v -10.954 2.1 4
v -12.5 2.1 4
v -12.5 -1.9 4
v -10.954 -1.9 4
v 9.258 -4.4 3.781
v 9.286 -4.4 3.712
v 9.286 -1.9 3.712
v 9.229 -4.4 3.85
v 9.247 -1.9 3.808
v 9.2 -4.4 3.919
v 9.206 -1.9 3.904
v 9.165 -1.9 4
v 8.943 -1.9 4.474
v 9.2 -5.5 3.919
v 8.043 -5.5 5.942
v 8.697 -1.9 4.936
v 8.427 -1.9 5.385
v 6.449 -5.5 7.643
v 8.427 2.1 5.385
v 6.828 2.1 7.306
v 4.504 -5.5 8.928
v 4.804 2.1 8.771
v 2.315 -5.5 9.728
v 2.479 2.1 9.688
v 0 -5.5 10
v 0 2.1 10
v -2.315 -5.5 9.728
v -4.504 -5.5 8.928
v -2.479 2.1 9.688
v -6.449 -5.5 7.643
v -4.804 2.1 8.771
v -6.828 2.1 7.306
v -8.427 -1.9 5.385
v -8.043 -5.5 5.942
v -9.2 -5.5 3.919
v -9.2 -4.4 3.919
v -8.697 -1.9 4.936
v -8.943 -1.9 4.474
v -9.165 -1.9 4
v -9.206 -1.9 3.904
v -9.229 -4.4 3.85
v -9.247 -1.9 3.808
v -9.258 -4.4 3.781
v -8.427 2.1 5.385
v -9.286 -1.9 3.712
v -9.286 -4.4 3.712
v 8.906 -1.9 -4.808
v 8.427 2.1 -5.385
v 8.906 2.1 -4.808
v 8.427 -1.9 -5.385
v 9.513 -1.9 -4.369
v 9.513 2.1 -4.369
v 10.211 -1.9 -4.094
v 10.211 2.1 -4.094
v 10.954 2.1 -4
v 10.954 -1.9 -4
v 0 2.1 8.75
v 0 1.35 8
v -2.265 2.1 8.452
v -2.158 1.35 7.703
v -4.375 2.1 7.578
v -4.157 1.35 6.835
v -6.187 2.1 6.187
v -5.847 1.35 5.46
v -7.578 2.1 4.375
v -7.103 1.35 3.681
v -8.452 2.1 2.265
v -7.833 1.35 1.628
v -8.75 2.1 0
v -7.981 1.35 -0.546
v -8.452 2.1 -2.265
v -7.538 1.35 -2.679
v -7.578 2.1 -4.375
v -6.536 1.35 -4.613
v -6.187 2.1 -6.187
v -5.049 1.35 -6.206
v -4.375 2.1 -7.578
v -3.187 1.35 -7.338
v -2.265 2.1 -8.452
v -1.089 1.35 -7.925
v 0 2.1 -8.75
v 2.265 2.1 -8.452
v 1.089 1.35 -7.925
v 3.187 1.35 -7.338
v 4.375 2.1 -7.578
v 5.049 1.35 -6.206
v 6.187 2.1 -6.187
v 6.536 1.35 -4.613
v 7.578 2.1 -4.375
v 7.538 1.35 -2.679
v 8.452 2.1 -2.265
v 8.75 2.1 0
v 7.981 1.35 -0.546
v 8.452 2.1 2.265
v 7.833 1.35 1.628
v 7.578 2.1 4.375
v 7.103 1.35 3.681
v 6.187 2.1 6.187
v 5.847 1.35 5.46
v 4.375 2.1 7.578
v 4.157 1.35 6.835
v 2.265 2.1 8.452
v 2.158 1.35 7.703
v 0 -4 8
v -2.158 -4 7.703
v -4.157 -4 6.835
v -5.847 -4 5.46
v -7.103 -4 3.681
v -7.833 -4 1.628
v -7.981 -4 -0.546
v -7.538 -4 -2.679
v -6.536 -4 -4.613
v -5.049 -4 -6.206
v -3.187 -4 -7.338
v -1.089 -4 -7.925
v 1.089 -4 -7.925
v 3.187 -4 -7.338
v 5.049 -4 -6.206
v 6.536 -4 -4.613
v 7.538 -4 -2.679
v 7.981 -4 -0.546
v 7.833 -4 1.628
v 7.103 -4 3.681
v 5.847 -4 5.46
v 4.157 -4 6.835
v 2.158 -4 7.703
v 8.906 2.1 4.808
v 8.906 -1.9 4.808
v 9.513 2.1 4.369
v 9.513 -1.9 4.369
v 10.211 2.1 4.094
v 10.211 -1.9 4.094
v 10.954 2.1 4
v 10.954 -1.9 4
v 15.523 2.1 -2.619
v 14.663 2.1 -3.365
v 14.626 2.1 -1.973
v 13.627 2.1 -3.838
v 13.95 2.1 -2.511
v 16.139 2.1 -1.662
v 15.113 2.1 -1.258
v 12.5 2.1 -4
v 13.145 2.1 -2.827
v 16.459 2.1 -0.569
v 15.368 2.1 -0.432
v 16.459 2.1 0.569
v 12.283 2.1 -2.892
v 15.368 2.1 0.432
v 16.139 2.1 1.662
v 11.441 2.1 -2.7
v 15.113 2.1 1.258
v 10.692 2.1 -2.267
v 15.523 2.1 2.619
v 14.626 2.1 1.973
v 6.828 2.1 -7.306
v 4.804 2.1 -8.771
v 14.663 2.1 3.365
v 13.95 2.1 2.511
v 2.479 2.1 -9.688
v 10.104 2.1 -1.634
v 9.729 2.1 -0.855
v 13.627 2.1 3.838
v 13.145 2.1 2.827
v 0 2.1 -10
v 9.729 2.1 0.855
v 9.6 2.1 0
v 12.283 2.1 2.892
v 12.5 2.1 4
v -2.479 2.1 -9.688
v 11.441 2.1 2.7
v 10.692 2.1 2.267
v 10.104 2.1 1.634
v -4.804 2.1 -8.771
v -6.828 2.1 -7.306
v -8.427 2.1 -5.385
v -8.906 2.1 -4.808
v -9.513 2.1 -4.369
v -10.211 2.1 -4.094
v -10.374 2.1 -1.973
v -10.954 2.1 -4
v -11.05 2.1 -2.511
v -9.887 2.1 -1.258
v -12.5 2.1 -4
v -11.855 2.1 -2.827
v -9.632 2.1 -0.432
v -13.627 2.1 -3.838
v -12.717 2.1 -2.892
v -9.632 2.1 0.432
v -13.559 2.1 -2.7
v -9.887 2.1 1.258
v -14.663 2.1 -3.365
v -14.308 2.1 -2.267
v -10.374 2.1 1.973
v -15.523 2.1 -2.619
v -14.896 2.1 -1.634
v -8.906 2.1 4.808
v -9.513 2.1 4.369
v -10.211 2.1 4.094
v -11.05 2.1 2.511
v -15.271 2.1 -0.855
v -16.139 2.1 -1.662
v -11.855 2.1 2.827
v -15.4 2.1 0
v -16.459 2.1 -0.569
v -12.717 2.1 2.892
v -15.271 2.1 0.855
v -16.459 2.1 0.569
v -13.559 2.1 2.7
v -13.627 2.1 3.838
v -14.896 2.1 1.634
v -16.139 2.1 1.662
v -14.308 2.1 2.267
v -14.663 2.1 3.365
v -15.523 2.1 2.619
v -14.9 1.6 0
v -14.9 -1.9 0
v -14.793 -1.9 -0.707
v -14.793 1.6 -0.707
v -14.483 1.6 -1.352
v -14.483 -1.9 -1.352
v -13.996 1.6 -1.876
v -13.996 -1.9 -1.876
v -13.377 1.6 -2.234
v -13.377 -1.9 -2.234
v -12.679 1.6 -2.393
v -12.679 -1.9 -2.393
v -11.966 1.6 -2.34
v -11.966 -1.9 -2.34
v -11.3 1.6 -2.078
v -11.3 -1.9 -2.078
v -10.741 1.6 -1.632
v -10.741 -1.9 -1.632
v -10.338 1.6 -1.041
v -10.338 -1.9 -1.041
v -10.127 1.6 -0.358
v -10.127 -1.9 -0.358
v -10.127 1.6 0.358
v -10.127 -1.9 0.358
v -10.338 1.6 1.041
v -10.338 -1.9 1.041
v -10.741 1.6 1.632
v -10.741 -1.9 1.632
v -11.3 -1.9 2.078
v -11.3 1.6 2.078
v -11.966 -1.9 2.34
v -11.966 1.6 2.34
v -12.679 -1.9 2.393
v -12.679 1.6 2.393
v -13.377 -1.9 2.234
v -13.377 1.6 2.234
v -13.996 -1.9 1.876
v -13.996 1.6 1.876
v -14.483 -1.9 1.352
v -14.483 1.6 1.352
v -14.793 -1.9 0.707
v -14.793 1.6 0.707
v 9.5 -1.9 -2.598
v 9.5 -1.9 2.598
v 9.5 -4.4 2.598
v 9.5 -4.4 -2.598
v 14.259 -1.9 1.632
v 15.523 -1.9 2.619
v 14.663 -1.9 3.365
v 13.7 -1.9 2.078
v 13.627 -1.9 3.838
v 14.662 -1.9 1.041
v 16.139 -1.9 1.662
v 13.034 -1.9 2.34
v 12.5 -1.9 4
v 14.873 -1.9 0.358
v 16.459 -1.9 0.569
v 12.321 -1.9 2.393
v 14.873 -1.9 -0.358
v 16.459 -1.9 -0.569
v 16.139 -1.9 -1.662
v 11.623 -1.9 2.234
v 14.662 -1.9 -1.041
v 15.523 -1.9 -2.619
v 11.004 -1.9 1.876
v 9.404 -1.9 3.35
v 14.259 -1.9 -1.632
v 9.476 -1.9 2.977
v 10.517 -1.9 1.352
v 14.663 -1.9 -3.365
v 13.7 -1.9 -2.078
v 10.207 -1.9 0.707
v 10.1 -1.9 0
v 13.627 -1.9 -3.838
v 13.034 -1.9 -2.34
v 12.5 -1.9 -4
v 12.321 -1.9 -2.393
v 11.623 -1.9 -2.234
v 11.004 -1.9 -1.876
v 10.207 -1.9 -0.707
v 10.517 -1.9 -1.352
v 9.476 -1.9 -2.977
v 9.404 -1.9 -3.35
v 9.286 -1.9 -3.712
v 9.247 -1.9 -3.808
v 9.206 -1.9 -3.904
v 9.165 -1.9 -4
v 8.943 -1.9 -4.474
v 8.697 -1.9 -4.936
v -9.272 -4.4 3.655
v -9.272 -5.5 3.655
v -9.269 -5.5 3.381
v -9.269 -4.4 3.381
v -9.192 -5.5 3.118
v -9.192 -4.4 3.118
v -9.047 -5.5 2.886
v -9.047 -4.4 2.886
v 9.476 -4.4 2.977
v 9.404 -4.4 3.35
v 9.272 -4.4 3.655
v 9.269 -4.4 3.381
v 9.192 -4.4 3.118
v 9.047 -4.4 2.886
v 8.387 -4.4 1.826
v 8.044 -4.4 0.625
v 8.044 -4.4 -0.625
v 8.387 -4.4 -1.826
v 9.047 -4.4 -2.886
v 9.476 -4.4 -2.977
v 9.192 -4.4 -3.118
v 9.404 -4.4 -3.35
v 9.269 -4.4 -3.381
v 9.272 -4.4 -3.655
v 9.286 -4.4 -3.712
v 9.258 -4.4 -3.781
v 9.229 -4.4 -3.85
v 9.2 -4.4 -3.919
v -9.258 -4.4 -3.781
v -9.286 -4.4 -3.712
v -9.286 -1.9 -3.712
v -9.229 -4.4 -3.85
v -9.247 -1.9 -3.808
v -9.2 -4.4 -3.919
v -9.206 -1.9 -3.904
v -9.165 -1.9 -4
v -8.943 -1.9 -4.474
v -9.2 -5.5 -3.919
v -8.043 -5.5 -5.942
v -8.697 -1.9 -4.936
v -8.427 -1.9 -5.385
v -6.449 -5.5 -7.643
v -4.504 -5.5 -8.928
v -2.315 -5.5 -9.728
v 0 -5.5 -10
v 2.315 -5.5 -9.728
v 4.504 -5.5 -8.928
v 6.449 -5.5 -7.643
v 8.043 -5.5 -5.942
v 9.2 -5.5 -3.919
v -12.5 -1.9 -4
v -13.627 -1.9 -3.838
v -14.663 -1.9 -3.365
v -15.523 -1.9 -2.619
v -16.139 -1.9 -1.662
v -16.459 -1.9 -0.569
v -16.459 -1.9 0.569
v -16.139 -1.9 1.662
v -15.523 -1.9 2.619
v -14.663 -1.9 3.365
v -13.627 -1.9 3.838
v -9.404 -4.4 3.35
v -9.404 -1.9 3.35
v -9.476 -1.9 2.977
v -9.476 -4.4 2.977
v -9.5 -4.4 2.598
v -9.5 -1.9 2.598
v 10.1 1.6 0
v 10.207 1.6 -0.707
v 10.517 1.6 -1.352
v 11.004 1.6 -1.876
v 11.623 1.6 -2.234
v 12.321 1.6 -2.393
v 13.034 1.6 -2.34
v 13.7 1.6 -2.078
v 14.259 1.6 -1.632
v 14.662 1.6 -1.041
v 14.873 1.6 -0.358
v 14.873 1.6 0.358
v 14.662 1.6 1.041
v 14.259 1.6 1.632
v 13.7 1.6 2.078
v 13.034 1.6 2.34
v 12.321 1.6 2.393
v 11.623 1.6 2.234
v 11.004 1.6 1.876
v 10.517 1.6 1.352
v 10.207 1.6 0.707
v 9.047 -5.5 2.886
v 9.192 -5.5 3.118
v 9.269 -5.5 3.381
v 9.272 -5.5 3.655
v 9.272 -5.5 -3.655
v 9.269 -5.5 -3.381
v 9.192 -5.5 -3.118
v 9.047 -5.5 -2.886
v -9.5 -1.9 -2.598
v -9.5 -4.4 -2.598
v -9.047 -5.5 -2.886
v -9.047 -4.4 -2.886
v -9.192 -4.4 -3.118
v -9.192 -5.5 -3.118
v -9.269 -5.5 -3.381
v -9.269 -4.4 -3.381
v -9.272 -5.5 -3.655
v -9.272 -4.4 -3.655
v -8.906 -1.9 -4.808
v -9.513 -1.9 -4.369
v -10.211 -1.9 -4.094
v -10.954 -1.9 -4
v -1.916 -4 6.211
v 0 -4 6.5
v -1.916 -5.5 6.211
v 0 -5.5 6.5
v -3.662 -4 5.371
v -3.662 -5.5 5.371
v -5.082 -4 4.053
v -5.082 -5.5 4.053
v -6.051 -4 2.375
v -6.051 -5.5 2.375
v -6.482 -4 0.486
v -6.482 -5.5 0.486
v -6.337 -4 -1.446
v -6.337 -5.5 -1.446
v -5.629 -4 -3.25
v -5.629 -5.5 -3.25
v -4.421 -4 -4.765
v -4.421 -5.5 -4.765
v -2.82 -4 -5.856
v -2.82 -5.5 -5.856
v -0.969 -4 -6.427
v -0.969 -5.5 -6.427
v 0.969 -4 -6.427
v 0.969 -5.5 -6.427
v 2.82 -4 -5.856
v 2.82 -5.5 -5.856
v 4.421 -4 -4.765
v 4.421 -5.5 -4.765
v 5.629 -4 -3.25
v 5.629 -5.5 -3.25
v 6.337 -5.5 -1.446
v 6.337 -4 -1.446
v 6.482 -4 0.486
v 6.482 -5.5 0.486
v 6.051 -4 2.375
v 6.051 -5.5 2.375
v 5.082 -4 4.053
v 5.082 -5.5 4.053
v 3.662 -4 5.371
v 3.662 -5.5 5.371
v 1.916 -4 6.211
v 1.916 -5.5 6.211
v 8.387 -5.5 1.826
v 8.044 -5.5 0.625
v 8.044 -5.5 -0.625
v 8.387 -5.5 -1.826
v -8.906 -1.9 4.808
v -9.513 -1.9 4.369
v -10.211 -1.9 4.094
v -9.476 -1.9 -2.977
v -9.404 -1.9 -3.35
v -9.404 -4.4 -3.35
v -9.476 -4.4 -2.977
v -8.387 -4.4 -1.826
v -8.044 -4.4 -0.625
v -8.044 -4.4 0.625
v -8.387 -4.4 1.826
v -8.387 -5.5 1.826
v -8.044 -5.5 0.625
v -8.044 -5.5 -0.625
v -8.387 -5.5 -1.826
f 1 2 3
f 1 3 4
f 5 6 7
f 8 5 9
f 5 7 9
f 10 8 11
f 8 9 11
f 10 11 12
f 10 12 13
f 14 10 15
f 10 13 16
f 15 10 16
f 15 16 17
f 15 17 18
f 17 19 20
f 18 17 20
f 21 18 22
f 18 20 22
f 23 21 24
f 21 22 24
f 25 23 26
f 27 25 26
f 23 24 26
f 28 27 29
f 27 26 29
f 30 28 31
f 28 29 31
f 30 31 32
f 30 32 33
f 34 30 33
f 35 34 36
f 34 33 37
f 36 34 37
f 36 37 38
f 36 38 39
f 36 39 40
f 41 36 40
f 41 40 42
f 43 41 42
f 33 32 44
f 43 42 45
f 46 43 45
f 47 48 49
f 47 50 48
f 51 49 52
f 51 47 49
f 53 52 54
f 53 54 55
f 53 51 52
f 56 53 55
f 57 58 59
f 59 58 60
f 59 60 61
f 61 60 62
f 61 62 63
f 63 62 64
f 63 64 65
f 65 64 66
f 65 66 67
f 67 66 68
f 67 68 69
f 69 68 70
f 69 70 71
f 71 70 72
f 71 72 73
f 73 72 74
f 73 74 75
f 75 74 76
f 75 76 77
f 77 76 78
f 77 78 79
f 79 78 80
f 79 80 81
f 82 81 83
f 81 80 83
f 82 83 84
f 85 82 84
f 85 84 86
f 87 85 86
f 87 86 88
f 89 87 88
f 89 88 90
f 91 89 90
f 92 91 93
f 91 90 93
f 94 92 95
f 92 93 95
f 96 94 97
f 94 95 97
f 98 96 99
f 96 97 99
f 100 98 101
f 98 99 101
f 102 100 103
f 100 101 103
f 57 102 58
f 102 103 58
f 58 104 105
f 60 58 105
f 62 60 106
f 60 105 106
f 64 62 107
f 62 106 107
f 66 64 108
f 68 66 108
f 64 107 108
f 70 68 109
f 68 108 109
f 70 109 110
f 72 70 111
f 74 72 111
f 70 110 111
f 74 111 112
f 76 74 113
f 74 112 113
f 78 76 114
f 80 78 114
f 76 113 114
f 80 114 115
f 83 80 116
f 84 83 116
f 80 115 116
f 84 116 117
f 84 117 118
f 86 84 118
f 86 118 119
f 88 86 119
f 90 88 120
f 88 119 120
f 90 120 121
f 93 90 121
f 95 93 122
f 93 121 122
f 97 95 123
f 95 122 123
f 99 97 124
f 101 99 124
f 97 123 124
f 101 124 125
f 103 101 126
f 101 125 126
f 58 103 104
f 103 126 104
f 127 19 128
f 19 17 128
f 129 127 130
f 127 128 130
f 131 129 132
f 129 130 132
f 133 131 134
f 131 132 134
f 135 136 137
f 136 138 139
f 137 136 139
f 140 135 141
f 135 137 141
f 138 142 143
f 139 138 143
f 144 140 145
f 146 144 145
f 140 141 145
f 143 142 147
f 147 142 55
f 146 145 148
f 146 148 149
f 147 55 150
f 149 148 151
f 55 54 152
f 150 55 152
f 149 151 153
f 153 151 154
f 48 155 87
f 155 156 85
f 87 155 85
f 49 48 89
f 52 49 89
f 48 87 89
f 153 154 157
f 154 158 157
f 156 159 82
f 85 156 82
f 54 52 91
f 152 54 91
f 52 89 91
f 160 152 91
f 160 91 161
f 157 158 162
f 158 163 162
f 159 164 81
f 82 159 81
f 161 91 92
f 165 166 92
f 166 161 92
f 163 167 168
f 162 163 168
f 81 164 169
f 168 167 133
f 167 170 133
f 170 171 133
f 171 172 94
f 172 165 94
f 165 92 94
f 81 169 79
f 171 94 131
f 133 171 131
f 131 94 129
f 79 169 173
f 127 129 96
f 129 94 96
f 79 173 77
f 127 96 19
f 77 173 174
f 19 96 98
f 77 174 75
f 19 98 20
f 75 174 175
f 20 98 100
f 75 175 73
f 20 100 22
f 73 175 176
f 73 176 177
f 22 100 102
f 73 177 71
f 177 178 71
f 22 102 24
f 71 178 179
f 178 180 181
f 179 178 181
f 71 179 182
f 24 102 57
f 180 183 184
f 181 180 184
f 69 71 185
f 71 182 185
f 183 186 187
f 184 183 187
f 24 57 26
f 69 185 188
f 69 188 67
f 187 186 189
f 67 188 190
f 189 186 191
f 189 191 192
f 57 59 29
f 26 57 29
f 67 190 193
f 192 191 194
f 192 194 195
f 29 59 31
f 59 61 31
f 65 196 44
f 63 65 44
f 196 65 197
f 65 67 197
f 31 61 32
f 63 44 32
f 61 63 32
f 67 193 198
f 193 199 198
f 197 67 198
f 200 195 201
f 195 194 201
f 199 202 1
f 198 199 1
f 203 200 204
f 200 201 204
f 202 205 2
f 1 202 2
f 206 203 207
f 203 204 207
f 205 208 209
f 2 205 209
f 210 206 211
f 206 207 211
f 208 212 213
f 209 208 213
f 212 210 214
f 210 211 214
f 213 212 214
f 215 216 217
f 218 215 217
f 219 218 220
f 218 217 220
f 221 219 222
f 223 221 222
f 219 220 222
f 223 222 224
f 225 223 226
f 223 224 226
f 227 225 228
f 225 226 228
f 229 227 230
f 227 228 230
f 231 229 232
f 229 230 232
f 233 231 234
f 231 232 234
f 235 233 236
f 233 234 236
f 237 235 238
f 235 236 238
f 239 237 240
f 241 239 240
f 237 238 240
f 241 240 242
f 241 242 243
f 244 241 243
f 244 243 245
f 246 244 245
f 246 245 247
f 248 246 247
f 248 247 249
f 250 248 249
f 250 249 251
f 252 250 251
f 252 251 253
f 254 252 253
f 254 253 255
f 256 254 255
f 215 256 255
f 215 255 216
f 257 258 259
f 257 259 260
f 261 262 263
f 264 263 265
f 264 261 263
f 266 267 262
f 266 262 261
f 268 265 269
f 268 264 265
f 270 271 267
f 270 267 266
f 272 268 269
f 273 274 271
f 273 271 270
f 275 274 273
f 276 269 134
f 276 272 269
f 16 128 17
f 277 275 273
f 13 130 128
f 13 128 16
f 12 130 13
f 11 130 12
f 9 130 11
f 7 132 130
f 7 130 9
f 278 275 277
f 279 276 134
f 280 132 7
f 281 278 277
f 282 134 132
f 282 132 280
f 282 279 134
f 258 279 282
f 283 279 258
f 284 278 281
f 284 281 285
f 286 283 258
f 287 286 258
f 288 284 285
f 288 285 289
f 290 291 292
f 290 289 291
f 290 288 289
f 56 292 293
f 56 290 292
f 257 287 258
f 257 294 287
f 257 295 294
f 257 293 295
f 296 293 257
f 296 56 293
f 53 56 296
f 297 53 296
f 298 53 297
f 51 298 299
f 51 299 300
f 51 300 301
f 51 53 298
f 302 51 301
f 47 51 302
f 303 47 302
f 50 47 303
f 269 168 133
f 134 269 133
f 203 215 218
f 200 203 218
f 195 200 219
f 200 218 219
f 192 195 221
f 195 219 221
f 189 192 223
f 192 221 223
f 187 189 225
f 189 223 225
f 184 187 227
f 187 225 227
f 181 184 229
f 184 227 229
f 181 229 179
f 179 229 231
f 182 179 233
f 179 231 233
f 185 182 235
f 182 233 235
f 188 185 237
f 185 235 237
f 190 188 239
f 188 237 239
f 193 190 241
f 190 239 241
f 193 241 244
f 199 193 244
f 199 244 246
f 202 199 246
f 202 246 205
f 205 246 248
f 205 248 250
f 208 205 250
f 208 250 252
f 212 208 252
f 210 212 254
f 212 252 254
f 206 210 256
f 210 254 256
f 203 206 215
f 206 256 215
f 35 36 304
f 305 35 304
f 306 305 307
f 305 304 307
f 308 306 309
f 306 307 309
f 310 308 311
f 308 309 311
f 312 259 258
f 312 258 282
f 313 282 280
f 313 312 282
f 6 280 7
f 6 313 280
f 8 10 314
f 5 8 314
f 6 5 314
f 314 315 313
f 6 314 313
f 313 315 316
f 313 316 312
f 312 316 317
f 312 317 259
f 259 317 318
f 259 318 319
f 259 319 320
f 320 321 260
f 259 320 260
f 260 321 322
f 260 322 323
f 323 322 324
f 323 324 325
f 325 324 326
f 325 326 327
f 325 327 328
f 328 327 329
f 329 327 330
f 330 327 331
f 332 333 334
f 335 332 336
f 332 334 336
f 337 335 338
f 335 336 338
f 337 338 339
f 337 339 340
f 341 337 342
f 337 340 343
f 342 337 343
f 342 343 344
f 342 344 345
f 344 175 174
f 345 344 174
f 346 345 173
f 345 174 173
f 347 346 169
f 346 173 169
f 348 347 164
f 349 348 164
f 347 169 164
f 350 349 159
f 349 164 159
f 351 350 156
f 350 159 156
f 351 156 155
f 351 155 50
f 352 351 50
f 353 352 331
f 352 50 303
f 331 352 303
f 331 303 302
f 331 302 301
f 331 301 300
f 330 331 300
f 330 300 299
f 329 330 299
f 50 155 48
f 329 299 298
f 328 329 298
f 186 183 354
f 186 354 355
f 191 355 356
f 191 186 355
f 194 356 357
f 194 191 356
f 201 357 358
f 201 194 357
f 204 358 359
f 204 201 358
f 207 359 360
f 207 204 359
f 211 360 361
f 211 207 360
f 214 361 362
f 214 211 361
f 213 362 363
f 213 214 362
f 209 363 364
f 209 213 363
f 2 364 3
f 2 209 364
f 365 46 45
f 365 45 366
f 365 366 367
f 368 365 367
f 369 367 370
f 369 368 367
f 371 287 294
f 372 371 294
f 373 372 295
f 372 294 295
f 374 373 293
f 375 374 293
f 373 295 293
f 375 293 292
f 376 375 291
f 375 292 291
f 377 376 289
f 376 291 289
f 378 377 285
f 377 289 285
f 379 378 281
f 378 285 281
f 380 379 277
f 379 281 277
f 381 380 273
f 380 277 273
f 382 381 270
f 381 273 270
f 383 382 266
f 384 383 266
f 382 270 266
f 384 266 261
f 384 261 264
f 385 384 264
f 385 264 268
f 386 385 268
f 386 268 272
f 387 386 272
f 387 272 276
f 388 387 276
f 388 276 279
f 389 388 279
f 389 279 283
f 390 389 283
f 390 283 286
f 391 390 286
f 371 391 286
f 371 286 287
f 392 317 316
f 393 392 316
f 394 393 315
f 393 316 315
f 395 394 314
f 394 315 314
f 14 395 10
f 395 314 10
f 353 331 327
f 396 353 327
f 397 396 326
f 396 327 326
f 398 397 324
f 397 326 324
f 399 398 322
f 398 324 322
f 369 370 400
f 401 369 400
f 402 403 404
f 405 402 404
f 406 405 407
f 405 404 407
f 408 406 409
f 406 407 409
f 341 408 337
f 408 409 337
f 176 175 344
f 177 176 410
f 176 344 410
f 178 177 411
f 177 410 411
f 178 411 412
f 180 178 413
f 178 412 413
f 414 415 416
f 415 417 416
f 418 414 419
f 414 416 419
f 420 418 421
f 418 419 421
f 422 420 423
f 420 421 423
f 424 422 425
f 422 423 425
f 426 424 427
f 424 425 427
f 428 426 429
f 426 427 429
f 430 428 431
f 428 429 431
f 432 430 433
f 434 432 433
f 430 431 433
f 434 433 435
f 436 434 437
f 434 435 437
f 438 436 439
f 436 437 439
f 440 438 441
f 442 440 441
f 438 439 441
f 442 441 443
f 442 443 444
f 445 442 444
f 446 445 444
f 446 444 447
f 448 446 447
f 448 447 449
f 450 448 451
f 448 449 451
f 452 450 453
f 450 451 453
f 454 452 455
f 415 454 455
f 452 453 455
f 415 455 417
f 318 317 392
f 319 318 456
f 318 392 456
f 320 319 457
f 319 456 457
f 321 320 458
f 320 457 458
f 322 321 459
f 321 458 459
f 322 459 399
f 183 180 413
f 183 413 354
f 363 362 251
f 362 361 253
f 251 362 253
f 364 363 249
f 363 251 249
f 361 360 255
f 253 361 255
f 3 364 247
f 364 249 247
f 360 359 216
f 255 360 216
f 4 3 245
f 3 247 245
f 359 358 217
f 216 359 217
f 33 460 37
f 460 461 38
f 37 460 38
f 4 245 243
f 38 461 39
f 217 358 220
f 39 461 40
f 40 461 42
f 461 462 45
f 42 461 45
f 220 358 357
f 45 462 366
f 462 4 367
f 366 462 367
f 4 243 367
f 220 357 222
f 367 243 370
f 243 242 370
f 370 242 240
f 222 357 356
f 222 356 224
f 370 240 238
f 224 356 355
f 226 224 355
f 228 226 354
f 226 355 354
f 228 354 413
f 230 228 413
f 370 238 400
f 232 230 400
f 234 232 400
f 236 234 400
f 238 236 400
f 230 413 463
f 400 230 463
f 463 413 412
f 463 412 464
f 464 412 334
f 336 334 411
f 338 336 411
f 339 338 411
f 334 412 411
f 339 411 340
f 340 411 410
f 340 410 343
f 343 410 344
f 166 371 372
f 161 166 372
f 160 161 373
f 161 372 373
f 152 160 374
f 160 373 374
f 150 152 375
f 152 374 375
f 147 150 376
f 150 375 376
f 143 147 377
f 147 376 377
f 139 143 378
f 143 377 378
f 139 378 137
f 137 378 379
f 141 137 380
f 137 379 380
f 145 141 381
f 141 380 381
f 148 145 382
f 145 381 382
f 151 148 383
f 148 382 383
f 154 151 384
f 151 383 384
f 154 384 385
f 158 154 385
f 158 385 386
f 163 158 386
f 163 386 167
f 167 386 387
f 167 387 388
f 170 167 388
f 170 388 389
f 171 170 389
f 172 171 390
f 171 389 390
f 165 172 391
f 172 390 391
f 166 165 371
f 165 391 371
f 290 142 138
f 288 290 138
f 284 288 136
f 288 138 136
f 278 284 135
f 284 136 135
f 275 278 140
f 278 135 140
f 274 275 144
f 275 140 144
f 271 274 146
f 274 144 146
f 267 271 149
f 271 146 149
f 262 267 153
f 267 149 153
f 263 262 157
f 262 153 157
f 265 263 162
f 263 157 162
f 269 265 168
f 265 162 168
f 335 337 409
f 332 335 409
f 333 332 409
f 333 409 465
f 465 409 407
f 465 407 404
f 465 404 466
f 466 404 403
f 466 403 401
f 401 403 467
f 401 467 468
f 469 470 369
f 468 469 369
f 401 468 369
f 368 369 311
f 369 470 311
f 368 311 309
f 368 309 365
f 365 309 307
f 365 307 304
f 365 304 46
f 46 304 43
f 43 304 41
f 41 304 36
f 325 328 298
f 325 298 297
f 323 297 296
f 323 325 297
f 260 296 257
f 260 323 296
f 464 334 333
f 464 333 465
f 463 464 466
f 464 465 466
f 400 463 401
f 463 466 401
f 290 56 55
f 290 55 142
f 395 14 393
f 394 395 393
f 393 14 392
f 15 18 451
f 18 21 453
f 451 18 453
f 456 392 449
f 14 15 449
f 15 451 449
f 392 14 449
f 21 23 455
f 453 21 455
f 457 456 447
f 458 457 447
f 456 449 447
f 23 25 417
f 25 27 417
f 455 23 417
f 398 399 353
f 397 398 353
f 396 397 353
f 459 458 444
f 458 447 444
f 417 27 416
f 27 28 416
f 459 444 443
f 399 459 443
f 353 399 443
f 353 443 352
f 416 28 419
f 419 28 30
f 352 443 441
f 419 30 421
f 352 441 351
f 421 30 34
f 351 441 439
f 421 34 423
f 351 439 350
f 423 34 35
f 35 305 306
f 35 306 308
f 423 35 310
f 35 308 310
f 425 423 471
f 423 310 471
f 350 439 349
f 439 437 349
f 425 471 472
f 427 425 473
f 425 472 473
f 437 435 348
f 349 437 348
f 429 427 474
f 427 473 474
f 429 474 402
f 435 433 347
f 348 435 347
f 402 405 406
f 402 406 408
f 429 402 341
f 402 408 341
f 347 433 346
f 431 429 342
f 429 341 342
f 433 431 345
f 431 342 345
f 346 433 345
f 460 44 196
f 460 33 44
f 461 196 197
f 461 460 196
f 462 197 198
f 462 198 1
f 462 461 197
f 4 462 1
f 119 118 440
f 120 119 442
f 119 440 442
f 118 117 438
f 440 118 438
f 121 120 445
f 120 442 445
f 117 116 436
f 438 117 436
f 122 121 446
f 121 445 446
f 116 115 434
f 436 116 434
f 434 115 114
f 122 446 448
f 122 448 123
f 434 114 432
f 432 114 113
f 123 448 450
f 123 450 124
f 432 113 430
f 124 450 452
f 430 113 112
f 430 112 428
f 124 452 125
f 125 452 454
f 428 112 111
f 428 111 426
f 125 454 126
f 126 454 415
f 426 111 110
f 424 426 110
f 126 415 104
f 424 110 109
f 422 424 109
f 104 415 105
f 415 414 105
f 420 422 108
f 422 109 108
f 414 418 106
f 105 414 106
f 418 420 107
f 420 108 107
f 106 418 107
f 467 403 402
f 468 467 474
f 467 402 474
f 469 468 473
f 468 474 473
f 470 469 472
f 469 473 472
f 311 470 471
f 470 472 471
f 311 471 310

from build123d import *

# Parameters (mm, degrees)
BOSS_EXTRU_1_DEPTH             = 4
ENL_V_START                    = -4
ENL_V_MAT_EXTRU_3_DEPTH        = 3.6
CONG_2_R                       = 3
CONG_3_R                       = 3
CONG_2_OF_SYM_TRIE1_R          = 3
CONG_3_OF_SYM_TRIE1_R          = 3
F_4_8_4_8_DIAMETER_HOLE2_D     = 4.8
F_4_8_4_8_DIAMETER_HOLE2_DEPTH = 6.4
F_4_8_4_8_DIAMETER_HOLE2_TIP   = 1.442065486
CHANFREIN1_SIZE                = 0.5
ESQUISSE9_R                    = 4.5
ENL_V_MAT_EXTRU_4_DEPTH        = 1.1
CONG_4_R                       = 1
CHANFREIN2_SIZE                = 0.75


with BuildPart() as part:
    # Esquisse1 → Révolution1 (revolve)
    with BuildSketch(Plane.XY, mode=Mode.PRIVATE) as r_volution1_sk:
        Polygon((-6.5, -4), (-6.5, -5.5), (-10, -5.5), (-10, 2.1), (-8, 2.1), (-8, -4), align=None)
    revolve(r_volution1_sk.sketch.rotate(Axis((0, 6.608552154, 0), (0, -1, 0)), 270), axis=Axis((0, 6.608552154, 0), (0, -1, 0)))

    # Esquisse2 → Boss.-Extru.1 (add)
    with BuildSketch(Plane(origin=(0, 2.1, 0), x_dir=(1, 0, 0), z_dir=(0, 1, 0))):
        with BuildLine():
            Line((-12.5, -4), (-9.16515139, -4))
            ThreePointArc((-9.16515139, -4), (-10, 0), (-9.16515139, 4))
            Line((-9.16515139, 4), (-12.5, 4))
            ThreePointArc((-12.5, 4), (-16.5, 0), (-12.5, -4))
        make_face()
    boss_extru_1 = extrude(amount=-BOSS_EXTRU_1_DEPTH)

    # Esquisse2<6> → Enlèv. mat.-Extru.3 (cut)
    with BuildSketch(Plane(origin=(0, 2.1, 0), x_dir=(1, 0, 0), z_dir=(0, 1, 0)).offset(ENL_V_START)):
        with BuildLine():
            ThreePointArc((-9.5, 3.122498999), (-10, 0), (-9.5, -3.122498999))
            Line((-9.5, -3.122498999), (-9.5, 3.122498999))
        make_face()
    enl_v_mat_extru_3 = extrude(amount=-ENL_V_MAT_EXTRU_3_DEPTH, mode=Mode.SUBTRACT)

    # Congé2
    cong_2_edges = [part.edges().sort_by_distance(p)[0] for p in [
        (-9.5, -3.7, 3.122498999),
        (-9.5, -3.7, -3.122498999),
    ]]
    fillet(cong_2_edges, radius=CONG_2_R)

    # Congé3
    cong_3_edges = [part.edges().sort_by_distance(p)[0] for p in [
        (-9.16515139, 0.1, -4),
        (-9.16515139, 0.1, 4),
    ]]
    fillet(cong_3_edges, radius=CONG_3_R)

    # Symétrie1: Boss.-Extru.1, Enlèv. mat.-Extru.3 across plane
    add(boss_extru_1.mirror(Plane(origin=(0, 0, 0), x_dir=(0, 0, 1), z_dir=(1, 0, 0))))
    add(enl_v_mat_extru_3.mirror(Plane(origin=(0, 0, 0), x_dir=(0, 0, 1), z_dir=(1, 0, 0))), mode=Mode.SUBTRACT)

    # Congé2 of Symétrie1
    cong_2_of_sym_trie1_edges = [part.edges().sort_by_distance(p)[0] for p in [
        (9.5, -3.7, 3.122498999),
        (9.5, -3.7, -3.122498999),
    ]]
    fillet(cong_2_of_sym_trie1_edges, radius=CONG_2_OF_SYM_TRIE1_R)

    # Congé3 of Symétrie1
    cong_3_of_sym_trie1_edges = [part.edges().sort_by_distance(p)[0] for p in [
        (9.16515139, 0.1, -4),
        (9.16515139, 0.1, 4),
    ]]
    fillet(cong_3_of_sym_trie1_edges, radius=CONG_3_OF_SYM_TRIE1_R)

    # Ø4.8 (4.8) Diameter Hole2
    with Locations(Plane(origin=(0, 2.1, 0), x_dir=(1, 0, 0), z_dir=(0, 1, 0))):
        with Locations((-12.5, 0), (12.5, 0)):
            Hole(F_4_8_4_8_DIAMETER_HOLE2_D / 2, depth=F_4_8_4_8_DIAMETER_HOLE2_DEPTH)
            with Locations((0, 0, -(F_4_8_4_8_DIAMETER_HOLE2_DEPTH + F_4_8_4_8_DIAMETER_HOLE2_TIP / 2))):  # 118° drill point
                Cone(0, F_4_8_4_8_DIAMETER_HOLE2_D / 2, F_4_8_4_8_DIAMETER_HOLE2_TIP, mode=Mode.SUBTRACT)

    # Chanfrein1
    chanfrein1_edges = [part.edges().sort_by_distance(p)[0] for p in [
        (14.9, 2.1, 0),
        (-10.1, 2.1, 0),
    ]]
    chamfer(chanfrein1_edges, length=CHANFREIN1_SIZE)

    # Esquisse9 → Enlèv. mat.-Extru.4 (cut)
    with BuildSketch(Plane.XZ.offset(5.5)):
        with Locations((-12.5, 0)):
            Circle(ESQUISSE9_R)
        with Locations((12.5, 0)):
            Circle(ESQUISSE9_R)
    extrude(amount=-ENL_V_MAT_EXTRU_4_DEPTH, mode=Mode.SUBTRACT)

    # Congé4
    # the kernel refuses this fillet: 1 mm, written as the material it takes off along each edge
    with BuildSketch(Plane(origin=(9.421052632, -4.4, 3.281780477), x_dir=(-0.686560042836171, 0, -0.7270731102033653), z_dir=(0, -1, 0))) as cong_4_piece_1:
        with BuildLine():
            CenterArc((0.604915781, -0.998168708), CONG_4_R, 93.468029374, 62.964308211)
            Line((-0.311672758, -0.598336932), (-0.403331612, -0.558353754))
            ThreePointArc((-0.403331612, -0.558353754), (-0.310284429, -0.351422835), (-0.083419367, 0.05514716))
            Line((-0.083419367, 0.05514716), (0.006049158, 0.099816871))
            ThreePointArc((0.006049158, 0.099816871), (0.272212102, 0.091759185), (0.538375045, 0.099816871))
            Line((0.538375045, 0.099816871), (0.544424203, 0))
        make_face()
    extrude(amount=2.786614567, mode=Mode.SUBTRACT)
    with BuildSketch(Plane(origin=(9.421052632, -4.4, -3.281780477), x_dir=(-0.6865600428361709, 0, 0.7270731102033654), z_dir=(0, -1, 0)), Plane(origin=(-9.421052632, -4.4, 3.281780477), x_dir=(0.6865600428361707, 0, -0.7270731102033658), z_dir=(0, -1, 0))) as cong_4_piece_2:
        with BuildLine():
            CenterArc((0.604915781, 0.998168708), CONG_4_R, 203.567662416, 62.964308211)
            Line((-0.311672758, 0.598336932), (-0.403331612, 0.558353754))
            ThreePointArc((-0.403331612, 0.558353754), (-0.310284429, 0.351422835), (-0.083419367, -0.05514716))
            Line((-0.083419367, -0.05514716), (0.006049158, -0.099816871))
            ThreePointArc((0.006049158, -0.099816871), (0.272212102, -0.091759185), (0.538375045, -0.099816871))
            Line((0.538375045, -0.099816871), (0.544424203, 0))
        make_face()
    extrude(amount=2.786614567, mode=Mode.SUBTRACT)
    with BuildSketch(Plane(origin=(-9.421052632, -4.4, -3.281780477), x_dir=(0.3276573021844398, 0, -0.9447966407249841), z_dir=(0, -1, 0))) as cong_4_piece_3:
        with BuildLine():
            CenterArc((0.605807396, 0.997627822), CONG_4_R, 210.982965052, 62.964308211)
            Line((-0.251512996, 0.482844619), (-0.337245035, 0.431366299))
            ThreePointArc((-0.337245035, 0.431366299), (-0.207136841, 0.199031418), (-0.091321217, -0.04074844))
            Line((-0.091321217, -0.04074844), (-0.010371424, -0.099460714))
            ThreePointArc((-0.010371424, -0.099460714), (0.455018696, -0.112838034), (0.68152967, -0.099762782))
            Line((0.68152967, -0.099762782), (0.674645827, 0))
        make_face()
    extrude(amount=2.786614567, mode=Mode.SUBTRACT)

    # Chanfrein2
    chanfrein2_edges = [part.edges().sort_by_distance(p)[0] for p in [
        (0, 2.1, -8),
    ]]
    chamfer(chanfrein2_edges, length=CHANFREIN2_SIZE)


solid = part.part
